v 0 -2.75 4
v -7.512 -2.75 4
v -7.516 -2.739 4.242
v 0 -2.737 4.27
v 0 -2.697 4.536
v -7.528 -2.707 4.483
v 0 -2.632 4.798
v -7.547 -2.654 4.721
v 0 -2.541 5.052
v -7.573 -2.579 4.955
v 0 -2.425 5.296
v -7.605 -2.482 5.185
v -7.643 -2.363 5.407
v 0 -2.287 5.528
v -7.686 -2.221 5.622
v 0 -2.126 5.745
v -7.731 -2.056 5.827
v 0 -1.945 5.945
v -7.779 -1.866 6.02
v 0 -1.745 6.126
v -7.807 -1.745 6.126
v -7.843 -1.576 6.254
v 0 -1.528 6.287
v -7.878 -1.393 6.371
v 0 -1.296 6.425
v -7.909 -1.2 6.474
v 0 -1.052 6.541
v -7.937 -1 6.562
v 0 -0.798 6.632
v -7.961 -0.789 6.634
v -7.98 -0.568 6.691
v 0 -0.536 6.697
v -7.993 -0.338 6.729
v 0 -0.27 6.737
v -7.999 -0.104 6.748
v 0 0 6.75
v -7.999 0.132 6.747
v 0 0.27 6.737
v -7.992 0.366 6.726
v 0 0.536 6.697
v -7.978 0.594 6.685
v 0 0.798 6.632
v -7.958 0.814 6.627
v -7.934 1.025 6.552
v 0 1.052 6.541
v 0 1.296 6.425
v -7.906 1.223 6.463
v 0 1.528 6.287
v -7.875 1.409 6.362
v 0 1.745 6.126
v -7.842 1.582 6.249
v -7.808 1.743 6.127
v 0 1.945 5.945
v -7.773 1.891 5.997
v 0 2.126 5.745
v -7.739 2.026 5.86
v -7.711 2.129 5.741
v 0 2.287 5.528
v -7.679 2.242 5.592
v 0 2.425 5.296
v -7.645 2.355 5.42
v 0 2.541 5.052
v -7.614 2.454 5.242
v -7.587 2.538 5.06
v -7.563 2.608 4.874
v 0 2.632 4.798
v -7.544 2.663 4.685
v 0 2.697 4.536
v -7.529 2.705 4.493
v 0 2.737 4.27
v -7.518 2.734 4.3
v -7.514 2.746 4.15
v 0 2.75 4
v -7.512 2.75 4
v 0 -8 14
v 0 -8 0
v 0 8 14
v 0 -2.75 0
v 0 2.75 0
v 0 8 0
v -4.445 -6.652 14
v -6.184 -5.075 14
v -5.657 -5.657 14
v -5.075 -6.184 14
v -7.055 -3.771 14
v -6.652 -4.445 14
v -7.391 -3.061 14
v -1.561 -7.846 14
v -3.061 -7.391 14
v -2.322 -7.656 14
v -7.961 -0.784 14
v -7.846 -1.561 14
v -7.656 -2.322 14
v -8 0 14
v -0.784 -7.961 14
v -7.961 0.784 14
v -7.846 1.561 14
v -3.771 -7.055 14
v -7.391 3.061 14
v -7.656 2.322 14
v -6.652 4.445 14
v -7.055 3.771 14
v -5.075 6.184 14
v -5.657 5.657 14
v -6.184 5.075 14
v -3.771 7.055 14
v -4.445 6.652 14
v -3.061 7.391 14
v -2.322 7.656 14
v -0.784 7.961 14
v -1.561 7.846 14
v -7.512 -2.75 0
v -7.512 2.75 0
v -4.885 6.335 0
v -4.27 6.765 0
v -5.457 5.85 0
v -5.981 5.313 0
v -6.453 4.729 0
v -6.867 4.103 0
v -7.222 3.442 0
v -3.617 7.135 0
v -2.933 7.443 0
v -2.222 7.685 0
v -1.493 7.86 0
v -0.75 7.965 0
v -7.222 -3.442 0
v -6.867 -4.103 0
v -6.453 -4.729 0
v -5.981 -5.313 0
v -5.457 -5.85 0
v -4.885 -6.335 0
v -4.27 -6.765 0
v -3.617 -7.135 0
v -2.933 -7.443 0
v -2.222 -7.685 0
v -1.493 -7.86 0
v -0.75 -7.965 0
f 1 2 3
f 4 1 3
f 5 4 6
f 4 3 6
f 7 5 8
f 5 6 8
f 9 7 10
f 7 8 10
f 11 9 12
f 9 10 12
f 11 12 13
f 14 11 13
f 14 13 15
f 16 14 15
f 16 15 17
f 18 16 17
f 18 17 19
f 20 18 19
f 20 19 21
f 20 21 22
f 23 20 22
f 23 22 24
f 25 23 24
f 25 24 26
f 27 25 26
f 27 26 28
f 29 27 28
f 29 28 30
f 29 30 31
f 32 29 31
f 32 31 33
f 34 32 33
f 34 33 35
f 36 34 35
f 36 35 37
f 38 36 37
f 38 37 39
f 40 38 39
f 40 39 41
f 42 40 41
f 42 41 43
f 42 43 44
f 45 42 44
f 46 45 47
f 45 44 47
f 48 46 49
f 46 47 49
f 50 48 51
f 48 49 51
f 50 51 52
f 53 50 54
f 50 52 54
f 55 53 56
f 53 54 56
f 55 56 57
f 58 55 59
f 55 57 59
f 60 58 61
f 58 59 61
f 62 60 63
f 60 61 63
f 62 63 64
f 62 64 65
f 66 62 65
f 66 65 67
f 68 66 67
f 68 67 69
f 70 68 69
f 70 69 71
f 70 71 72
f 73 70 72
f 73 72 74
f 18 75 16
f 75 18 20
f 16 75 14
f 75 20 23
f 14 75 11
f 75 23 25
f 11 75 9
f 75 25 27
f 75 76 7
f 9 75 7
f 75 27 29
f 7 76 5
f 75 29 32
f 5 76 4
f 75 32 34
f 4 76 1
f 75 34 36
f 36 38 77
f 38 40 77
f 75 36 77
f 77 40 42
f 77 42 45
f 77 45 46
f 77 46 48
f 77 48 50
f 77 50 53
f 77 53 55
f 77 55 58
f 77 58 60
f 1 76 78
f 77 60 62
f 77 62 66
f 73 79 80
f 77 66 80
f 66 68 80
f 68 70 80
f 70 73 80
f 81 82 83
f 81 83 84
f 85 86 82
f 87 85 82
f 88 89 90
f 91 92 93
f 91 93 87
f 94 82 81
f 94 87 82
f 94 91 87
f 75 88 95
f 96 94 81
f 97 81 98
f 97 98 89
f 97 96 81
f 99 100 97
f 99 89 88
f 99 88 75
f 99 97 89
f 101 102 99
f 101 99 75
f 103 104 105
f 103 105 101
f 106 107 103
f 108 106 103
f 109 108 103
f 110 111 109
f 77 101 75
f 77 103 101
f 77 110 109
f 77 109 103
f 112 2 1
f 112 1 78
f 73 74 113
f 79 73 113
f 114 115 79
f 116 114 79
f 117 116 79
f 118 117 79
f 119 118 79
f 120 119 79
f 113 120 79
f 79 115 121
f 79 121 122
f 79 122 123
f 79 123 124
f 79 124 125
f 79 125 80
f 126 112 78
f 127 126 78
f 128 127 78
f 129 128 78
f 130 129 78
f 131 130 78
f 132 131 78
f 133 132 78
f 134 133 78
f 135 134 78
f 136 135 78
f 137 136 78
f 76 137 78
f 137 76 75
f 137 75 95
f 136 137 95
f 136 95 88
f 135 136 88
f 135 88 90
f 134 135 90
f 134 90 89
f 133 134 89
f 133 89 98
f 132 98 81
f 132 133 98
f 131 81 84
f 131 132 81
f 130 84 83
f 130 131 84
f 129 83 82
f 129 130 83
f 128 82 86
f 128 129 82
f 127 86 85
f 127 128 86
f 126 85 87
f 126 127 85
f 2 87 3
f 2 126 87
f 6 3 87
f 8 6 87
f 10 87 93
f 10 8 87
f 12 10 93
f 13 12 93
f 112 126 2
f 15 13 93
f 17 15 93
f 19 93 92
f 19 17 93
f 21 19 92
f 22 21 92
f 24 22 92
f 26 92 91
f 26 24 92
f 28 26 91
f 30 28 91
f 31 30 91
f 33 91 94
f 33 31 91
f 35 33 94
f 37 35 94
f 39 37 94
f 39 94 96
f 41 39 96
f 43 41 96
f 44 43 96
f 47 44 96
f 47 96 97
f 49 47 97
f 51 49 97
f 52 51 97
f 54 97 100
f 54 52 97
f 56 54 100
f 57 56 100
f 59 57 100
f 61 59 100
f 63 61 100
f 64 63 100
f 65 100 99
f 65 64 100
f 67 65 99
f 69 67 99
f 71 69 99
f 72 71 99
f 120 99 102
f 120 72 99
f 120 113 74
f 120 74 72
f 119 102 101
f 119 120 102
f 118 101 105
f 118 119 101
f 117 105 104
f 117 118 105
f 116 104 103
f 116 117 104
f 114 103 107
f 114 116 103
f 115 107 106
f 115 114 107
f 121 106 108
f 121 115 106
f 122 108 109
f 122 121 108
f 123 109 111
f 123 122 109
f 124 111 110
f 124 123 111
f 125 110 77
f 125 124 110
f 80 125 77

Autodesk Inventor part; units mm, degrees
ref_plane "YZ Plane" through (0, 0, 0) normal (1, 0, 0) x (0, 1, 0)
ref_plane "XZ Plane" through (0, 0, 0) normal (0, 1, 0) x (-1, 0, 0)
ref_plane "XY Plane" through (0, 0, 0) normal (0, 0, 1) x (1, 0, 0)
sketch "Skizze1" plane through (0, 0, 0) normal (0, 0, 1) x (1, 0, 0)
  circle A0 centre (0, 0) radius 8
  line L0 (0, -8) -> (0, 8)
  dimension "d0" = 16
extrude "Extrusion1" add sketch "Skizze1" along normal blind 14 contours L0 A0 picked at (-4.0721, -1.7428)
sketch "Skizze2" plane through (0, -8, 0) normal (1, 0, 0) x (0, 0, -1)
  line L0 (0, 0) -> (0, 16) construction
  line L1 (0, 16) -> (-14, 16) construction
  line L2 (-14, 0) -> (-14, 16) construction
  line L3 (0, 0) -> (-14, 0) construction
  line L4 (-14, 16) -> (-14, 0) construction
  line L5 (0, 16) -> (0, 0) construction
  line L6 (-14, 16) -> (0, 0) construction
  line L7 (0, 0) -> (-14, 0) construction
  line L8 (-14, 0) -> (0, 16) construction
  line L9 (-14, 8) -> (0, 8) construction
  point P0 (-4, 8)
  dimension "d12" = 4
hole "Bohrung1" at (0, 0, 4) direction (-1, 0, 0) diameter 5.5 end through all clearance for "Inbusschraube DIN EN ISO 4762" size "M5" standard "DIN"
sketch "Skizze3" plane through (0, -8, 0) normal (1, 0, 0) x (0, 0, -1)
  circle A0 centre (-4, 8) radius 2.75
  line L0 (-4, 5.25) -> (0, 5.25)
  line L1 (0, 16) -> (0, 0) construction
  line L2 (-4, 10.75) -> (0, 10.75)
  line L3 (0, 5.25) -> (0, 10.75)
  circle A1 centre (-4, 8) radius 2.75 construction
  point P0 (0, 8)
extrude "Extrusion2" cut sketch "Skizze3" against normal through all contours A0 L2 L3 L0
properties part number "Gabel_Enforcement"
